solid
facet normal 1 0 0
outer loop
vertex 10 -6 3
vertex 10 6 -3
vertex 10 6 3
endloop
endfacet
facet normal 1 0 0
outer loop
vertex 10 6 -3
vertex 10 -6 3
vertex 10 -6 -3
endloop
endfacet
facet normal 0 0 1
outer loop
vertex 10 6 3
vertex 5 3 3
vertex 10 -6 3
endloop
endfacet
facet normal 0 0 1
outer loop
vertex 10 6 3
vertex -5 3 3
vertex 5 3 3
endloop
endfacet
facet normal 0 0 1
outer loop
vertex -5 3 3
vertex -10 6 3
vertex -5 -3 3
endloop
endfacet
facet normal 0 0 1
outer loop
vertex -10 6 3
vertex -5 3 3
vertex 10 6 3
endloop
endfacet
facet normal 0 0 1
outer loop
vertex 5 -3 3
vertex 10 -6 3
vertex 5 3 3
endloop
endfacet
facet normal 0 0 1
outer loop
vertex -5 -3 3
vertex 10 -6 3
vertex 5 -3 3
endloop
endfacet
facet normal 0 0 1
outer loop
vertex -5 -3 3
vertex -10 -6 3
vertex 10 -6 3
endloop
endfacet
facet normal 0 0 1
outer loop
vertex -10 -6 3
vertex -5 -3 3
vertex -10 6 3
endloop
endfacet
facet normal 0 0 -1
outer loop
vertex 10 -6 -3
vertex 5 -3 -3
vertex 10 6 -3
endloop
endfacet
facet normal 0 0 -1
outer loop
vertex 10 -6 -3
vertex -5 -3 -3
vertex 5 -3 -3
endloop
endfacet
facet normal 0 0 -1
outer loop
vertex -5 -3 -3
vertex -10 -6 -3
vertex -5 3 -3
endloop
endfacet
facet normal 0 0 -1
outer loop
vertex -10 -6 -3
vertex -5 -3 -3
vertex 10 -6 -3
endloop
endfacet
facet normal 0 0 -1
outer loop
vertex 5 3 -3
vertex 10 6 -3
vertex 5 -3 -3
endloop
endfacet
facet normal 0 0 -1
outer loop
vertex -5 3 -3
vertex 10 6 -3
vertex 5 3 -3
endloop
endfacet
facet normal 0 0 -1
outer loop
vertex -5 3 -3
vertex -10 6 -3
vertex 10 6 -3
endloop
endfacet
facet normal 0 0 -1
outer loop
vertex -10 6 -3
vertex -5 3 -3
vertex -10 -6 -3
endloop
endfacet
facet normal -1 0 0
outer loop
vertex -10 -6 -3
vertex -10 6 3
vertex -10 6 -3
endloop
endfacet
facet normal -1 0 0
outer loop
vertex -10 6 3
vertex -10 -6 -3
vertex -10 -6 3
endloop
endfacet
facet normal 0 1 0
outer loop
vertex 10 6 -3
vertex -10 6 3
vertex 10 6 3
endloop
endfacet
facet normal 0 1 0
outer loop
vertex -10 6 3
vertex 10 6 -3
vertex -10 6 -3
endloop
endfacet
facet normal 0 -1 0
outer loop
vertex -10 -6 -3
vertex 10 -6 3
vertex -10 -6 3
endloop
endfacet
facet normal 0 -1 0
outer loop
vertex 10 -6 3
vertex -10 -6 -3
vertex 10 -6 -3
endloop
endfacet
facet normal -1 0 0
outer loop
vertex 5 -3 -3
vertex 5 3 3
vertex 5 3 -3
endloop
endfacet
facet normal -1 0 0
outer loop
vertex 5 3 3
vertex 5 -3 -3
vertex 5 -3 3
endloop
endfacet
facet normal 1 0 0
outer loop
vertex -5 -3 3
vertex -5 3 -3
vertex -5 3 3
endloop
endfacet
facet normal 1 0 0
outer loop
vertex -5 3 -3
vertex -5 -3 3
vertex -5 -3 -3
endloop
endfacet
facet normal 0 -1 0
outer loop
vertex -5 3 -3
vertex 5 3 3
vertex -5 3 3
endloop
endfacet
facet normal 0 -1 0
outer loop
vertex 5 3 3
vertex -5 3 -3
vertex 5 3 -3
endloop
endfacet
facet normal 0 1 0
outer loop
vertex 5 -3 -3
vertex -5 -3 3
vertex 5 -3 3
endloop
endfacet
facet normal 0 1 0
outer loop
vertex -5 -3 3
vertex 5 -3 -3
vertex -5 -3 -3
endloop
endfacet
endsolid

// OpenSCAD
// file: ../scad_reference/main.scad
module main(){difference(){cube([20,12,6], center=true); translate([0,0,0]) cube([10,6,8], center=true);}}
// main file
$fn = 50;

use <../scad_reference/main.scad>;

difference() {
	union() {
		main();
	}
	union();
}
